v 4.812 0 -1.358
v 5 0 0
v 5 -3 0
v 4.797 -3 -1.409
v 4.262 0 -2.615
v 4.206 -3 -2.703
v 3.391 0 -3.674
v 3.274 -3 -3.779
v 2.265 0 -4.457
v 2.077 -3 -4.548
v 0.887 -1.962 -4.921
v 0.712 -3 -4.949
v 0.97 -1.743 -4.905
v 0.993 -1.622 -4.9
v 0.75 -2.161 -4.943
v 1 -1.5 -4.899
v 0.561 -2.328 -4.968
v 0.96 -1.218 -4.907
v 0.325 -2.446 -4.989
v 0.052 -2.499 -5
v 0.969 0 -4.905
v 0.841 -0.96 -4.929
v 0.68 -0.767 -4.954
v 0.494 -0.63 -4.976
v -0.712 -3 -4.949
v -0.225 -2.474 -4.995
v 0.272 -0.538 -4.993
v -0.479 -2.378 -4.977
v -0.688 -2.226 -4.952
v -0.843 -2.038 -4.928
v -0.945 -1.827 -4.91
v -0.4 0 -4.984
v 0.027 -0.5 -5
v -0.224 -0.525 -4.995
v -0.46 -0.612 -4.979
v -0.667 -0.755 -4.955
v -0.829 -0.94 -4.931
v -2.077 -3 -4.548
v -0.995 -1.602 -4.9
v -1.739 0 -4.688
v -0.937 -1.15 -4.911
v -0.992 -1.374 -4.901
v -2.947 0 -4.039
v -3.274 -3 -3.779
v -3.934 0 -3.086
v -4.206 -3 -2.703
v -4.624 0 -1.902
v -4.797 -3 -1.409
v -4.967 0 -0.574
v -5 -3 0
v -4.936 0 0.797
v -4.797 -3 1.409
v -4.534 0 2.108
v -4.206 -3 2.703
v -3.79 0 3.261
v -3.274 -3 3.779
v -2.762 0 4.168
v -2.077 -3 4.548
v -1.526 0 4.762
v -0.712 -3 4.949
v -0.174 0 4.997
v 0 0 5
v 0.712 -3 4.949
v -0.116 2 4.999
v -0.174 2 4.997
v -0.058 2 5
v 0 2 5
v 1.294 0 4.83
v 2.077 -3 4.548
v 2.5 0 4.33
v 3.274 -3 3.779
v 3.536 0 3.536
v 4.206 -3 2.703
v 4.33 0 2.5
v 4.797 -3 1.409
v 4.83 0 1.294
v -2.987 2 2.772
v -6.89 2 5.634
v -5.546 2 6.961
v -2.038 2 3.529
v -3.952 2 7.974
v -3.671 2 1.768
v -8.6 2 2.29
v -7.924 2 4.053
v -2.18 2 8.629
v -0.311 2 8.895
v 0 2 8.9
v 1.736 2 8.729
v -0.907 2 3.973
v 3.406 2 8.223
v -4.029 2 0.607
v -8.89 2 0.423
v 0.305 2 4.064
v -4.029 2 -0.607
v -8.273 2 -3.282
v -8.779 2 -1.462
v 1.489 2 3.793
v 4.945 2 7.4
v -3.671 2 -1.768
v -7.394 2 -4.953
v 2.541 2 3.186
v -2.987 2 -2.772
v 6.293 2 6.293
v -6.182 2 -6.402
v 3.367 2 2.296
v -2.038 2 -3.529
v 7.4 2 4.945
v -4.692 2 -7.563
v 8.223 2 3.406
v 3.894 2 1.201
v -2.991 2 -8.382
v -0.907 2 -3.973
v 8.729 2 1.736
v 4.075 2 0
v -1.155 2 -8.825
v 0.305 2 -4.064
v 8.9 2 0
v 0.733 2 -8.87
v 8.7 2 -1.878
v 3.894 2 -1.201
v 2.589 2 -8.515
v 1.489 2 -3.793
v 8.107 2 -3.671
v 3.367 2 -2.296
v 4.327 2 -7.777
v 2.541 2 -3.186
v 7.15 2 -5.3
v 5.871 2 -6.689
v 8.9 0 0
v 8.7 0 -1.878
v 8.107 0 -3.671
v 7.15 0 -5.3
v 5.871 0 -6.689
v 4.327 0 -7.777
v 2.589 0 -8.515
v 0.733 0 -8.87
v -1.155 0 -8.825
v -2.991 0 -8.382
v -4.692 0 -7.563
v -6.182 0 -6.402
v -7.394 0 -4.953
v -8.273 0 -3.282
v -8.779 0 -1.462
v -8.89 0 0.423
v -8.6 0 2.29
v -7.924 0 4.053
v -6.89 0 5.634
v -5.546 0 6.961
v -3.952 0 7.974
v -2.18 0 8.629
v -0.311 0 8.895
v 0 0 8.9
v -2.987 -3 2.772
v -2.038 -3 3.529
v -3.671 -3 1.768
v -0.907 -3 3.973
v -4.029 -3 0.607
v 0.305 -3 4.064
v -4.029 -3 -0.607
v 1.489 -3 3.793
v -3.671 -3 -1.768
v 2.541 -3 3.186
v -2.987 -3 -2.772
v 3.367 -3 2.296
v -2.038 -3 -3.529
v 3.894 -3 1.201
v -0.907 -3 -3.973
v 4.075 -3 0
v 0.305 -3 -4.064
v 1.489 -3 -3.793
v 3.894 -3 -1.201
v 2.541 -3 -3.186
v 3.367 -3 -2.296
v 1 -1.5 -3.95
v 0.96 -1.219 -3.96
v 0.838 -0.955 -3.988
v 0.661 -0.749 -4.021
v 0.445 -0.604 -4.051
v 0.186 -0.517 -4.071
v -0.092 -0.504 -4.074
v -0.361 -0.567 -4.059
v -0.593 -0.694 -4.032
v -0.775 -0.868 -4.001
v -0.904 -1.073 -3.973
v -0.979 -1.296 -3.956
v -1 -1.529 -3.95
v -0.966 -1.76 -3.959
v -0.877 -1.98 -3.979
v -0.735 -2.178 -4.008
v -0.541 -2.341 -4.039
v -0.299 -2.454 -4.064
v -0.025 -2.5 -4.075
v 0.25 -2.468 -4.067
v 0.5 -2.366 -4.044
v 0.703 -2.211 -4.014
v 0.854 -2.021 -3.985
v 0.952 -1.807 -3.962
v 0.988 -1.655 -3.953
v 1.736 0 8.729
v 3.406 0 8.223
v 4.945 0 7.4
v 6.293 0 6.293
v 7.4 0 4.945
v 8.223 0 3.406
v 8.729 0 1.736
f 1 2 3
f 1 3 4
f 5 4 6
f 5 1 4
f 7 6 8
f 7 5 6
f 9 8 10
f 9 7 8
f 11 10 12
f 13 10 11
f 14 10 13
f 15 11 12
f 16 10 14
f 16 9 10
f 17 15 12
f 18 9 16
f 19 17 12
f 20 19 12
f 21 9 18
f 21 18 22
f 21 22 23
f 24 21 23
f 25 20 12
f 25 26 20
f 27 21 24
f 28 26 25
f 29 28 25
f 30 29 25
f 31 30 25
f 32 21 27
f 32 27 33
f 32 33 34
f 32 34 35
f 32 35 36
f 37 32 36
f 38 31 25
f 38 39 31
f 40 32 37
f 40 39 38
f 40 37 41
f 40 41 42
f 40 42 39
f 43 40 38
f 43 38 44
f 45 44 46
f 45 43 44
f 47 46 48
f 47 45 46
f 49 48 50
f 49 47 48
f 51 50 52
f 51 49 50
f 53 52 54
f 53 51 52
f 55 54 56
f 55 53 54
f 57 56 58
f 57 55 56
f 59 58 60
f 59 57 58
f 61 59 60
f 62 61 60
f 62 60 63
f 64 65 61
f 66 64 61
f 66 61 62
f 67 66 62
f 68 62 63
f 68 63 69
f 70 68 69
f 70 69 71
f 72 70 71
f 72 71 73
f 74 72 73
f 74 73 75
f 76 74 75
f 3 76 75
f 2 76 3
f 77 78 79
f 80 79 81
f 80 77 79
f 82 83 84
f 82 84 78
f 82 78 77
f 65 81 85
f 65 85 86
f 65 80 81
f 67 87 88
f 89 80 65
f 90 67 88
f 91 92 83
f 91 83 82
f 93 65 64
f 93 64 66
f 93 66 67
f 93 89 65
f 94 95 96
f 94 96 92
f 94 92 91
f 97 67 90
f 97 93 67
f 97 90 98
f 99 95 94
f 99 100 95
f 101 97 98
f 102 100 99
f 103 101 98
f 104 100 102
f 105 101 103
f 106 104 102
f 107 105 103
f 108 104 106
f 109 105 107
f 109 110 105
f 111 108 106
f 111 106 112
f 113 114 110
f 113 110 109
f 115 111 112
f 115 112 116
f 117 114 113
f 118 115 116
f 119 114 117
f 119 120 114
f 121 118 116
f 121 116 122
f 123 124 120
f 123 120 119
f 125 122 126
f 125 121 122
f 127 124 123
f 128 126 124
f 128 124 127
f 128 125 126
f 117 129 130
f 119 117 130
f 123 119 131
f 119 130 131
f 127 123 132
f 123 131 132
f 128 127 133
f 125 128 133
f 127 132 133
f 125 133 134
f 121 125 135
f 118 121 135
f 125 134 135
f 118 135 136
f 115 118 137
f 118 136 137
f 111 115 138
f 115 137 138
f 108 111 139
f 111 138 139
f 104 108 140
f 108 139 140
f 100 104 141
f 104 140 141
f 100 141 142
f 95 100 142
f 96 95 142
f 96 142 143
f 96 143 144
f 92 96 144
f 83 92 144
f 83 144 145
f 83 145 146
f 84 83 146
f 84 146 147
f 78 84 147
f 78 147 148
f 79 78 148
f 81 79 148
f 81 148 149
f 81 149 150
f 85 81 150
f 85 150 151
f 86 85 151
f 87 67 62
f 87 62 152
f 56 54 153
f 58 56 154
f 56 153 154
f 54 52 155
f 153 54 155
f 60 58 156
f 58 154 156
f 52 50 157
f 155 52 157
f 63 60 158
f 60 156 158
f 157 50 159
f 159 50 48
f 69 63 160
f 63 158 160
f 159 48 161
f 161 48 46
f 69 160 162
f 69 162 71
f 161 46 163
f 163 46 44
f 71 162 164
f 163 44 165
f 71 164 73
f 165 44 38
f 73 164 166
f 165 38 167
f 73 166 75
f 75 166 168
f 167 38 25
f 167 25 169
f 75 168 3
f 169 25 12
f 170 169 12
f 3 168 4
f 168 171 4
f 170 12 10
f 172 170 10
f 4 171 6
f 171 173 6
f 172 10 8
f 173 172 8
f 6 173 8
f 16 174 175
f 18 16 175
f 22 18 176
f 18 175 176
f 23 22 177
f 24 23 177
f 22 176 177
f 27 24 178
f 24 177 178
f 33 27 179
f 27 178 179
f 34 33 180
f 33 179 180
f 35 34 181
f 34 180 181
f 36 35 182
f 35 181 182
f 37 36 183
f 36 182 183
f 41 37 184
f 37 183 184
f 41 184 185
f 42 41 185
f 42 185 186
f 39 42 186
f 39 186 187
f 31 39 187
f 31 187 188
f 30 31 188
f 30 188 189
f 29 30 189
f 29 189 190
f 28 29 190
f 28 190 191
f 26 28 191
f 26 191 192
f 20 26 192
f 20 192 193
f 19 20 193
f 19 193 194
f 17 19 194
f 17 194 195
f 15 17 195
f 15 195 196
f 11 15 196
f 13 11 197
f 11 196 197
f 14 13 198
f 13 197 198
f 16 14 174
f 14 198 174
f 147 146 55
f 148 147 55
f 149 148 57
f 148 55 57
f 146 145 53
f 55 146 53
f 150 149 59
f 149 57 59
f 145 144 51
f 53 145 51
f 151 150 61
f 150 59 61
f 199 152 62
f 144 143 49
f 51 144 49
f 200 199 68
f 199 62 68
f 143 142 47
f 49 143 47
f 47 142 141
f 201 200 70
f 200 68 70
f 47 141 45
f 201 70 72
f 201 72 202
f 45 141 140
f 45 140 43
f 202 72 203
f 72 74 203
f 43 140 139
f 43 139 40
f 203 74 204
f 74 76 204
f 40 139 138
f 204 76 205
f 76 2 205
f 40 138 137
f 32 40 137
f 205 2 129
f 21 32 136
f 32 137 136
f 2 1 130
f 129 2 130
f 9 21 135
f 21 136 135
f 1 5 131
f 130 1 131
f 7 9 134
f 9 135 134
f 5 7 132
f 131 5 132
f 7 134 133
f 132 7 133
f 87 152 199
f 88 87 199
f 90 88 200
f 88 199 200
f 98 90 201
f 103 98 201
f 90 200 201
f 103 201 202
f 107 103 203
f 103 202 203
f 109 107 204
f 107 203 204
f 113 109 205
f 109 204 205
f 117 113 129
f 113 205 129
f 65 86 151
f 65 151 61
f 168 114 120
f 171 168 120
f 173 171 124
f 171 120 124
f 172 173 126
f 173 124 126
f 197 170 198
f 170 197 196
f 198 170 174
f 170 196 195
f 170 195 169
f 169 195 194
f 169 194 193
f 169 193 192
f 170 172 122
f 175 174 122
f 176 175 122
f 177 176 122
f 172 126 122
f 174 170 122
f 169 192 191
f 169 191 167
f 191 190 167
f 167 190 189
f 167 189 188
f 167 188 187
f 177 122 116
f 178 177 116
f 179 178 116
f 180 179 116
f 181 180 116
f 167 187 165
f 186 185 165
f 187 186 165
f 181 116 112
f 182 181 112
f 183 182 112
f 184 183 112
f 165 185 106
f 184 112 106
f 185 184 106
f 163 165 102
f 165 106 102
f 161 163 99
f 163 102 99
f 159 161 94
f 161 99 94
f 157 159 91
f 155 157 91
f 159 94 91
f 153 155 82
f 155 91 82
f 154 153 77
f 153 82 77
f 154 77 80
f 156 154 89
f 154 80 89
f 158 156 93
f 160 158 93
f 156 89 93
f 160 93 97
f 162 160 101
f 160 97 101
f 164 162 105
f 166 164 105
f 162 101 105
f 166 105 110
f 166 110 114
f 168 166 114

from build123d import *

# Parameters (mm, degrees)
SKETCH1_R           = 8.9
SKETCH1_R_2         = 4
BOSS_EXTRUDE1_DEPTH = 2
CUT_EXTRUDE1_DEPTH  = 2
SKETCH3_R           = 5
SKETCH3_R_2         = 4
BOSS_EXTRUDE2_DEPTH = 5
SKETCH4_R           = 4.075
CUT_EXTRUDE2_DEPTH  = 15
SKETCH6_R           = 1
CUT_EXTRUDE3_DEPTH  = 15


with BuildPart() as part:
    # Sketch1 → Boss-Extrude1 (new body)
    with BuildSketch(Plane(origin=(0, 0, 0), x_dir=(1, 0, 0), z_dir=(0, 1, 0))):
        Circle(SKETCH1_R)
        Circle(SKETCH1_R_2, mode=Mode.SUBTRACT)
    extrude(amount=BOSS_EXTRUDE1_DEPTH)

    # Sketch2 → Cut-Extrude1 (cut)
    with BuildSketch(Plane(origin=(0, 2, 0), x_dir=(1, 0, 0), z_dir=(0, 1, 0))):
        Polygon((0, 0), (0, -10.52604124), (-0.355401251, -10.177360244), align=None)
    extrude(amount=-CUT_EXTRUDE1_DEPTH, mode=Mode.SUBTRACT)

    # Sketch3 → Boss-Extrude2 (add)
    with BuildSketch(Plane(origin=(0, 2, 0), x_dir=(1, 0, 0), z_dir=(0, 1, 0))):
        Circle(SKETCH3_R)
        Circle(SKETCH3_R_2, mode=Mode.SUBTRACT)
    extrude(amount=-BOSS_EXTRUDE2_DEPTH)

    # Sketch4 → Cut-Extrude2 (cut)
    with BuildSketch(Plane(origin=(0, 2, 0), x_dir=(1, 0, 0), z_dir=(0, 1, 0))):
        Circle(SKETCH4_R)
    extrude(amount=-CUT_EXTRUDE2_DEPTH, mode=Mode.SUBTRACT)

    # Sketch6 → Cut-Extrude3 (cut)
    with BuildSketch(Plane.XY):
        with Locations((0, -1.5)):
            Circle(SKETCH6_R)
    extrude(amount=-CUT_EXTRUDE3_DEPTH, mode=Mode.SUBTRACT)


solid = part.part
